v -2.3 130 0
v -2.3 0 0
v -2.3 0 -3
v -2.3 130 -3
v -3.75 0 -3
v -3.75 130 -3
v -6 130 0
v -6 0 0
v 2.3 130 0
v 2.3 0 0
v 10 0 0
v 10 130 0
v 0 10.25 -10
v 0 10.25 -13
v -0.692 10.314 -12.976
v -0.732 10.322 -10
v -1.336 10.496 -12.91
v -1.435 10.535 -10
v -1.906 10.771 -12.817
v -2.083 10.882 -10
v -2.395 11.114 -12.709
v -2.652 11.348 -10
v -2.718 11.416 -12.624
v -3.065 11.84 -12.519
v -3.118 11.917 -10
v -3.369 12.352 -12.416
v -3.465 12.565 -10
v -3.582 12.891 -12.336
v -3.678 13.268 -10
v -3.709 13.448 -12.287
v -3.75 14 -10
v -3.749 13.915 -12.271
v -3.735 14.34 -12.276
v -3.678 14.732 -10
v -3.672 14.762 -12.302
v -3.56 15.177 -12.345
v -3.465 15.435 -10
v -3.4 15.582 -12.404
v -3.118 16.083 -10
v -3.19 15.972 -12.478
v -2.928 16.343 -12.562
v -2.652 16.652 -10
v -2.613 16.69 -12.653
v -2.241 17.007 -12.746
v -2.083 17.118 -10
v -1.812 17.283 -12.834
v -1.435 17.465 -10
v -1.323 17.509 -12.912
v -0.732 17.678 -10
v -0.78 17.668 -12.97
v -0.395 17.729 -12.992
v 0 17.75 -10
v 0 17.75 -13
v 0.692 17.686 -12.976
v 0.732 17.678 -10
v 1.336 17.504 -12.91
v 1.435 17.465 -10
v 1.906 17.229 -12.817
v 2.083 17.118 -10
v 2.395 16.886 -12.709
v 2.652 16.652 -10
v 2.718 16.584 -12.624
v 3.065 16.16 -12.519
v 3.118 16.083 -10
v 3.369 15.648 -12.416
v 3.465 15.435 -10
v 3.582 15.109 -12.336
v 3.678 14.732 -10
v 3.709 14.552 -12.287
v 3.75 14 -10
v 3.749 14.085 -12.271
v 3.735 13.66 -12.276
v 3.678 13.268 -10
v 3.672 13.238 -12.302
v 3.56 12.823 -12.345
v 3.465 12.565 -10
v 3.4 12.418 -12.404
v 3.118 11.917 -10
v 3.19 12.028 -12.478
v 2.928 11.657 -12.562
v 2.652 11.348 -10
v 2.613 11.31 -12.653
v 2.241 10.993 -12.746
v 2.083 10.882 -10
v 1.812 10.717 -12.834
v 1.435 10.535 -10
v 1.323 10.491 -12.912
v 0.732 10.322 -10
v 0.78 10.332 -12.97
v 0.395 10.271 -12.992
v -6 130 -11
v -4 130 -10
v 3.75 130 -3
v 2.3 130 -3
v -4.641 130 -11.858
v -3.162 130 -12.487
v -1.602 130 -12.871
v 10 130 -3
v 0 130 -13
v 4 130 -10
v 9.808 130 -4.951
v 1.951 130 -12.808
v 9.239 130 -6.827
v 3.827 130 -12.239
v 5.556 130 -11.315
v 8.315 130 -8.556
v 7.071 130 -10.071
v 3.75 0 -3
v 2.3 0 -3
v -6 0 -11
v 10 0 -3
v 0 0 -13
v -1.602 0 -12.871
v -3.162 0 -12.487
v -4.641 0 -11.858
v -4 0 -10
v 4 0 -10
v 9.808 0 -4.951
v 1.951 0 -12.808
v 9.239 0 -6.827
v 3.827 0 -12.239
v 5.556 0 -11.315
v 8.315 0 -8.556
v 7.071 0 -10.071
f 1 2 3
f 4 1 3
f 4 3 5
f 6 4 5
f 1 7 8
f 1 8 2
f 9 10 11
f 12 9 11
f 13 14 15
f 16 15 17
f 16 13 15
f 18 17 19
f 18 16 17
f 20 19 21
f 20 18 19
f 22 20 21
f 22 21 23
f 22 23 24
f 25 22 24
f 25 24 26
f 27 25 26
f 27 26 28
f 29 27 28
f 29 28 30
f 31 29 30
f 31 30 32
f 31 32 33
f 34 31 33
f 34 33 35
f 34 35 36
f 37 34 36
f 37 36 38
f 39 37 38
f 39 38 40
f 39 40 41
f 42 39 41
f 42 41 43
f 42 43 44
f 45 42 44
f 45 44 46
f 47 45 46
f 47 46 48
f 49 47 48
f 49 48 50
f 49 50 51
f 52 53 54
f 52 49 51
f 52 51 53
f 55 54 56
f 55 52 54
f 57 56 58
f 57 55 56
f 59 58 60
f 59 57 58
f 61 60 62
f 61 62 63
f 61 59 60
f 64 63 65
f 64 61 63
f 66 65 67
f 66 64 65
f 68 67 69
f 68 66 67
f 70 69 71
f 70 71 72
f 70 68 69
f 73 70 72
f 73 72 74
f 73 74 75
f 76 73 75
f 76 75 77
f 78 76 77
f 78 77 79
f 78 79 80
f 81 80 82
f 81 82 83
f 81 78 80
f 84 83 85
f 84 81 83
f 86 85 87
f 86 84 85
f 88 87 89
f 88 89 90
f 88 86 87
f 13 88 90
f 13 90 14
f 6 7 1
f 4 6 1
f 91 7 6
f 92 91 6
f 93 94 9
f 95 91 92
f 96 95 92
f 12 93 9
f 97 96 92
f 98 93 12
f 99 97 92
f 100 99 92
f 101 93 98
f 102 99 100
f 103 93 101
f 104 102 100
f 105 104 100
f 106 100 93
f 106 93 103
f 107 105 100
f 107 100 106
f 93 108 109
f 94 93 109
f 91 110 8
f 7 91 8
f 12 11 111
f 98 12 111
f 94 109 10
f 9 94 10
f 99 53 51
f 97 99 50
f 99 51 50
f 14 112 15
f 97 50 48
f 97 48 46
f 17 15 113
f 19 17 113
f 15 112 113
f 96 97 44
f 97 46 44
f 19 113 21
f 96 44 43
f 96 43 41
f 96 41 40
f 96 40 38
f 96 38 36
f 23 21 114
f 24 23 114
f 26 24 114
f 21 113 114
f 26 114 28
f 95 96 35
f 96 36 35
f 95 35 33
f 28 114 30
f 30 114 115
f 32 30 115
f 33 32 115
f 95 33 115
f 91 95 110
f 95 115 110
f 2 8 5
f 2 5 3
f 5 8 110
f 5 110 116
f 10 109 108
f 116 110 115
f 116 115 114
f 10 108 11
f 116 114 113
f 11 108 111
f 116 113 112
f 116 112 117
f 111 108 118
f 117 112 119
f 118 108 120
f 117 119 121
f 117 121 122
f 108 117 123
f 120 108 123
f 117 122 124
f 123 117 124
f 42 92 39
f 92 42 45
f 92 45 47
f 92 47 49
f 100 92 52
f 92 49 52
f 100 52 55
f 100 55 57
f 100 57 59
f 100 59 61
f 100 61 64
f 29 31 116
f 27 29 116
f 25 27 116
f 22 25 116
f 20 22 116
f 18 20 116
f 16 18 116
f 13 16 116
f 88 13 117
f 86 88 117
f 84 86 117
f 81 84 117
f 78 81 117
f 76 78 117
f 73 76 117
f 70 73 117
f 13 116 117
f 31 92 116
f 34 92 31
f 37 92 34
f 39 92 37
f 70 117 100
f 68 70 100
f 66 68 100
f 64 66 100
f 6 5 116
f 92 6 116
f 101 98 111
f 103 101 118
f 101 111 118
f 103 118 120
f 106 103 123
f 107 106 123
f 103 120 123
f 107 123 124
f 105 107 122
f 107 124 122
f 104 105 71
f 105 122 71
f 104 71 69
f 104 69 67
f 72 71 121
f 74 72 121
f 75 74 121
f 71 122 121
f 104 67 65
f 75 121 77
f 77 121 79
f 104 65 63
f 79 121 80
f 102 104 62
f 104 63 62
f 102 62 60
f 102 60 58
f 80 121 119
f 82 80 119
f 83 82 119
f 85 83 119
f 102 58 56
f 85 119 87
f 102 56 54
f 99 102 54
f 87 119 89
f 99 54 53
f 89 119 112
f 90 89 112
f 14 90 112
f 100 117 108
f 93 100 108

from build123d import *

# Parameters (mm, degrees)
AUFSATZ_LINEAR_AUSTRAGEN1_DEPTH = 130
SKIZZE2_R                       = 3.75
SCHNITT_LINEAR_AUSTRAGEN1_DEPTH = 131.766968306


with BuildPart() as part:
    # Skizze1 → Aufsatz-Linear austragen1 (new body)
    with BuildSketch(Plane(origin=(0, 0, 0), x_dir=(1, 0, 0), z_dir=(0, 1, 0))):
        with BuildLine():
            Line((2.3, 0), (10, 0))
            Line((10, 0), (10, 3))
            ThreePointArc((10, 3), (7.071067812, 10.071067812), (0, 13))
            ThreePointArc((0, 13), (-3.16227766, 12.486832981), (-6, 11))
            Line((-6, 11), (-6, 0))
            Line((-6, 0), (-2.3, 0))
            Line((-2.3, 0), (-2.3, 3))
            Line((-2.3, 3), (-3.75, 3))
            Line((-3.75, 3), (-4, 10))
            Line((-4, 10), (4, 10))
            Line((4, 10), (3.75, 3))
            Line((3.75, 3), (2.3, 3))
            Line((2.3, 3), (2.3, 0))
        make_face()
    extrude(amount=AUFSATZ_LINEAR_AUSTRAGEN1_DEPTH)

    # Skizze2 → Schnitt-Linear austragen1 (cut, through all)
    with BuildSketch(Plane(origin=(0, 0, -3), x_dir=(-1, 0, 0), z_dir=(0, 0, -1))):
        with Locations(Location((0, 14, 0), (0, 0, 270))):
            Circle(SKIZZE2_R)
    extrude(amount=SCHNITT_LINEAR_AUSTRAGEN1_DEPTH, mode=Mode.SUBTRACT)


solid = part.part
